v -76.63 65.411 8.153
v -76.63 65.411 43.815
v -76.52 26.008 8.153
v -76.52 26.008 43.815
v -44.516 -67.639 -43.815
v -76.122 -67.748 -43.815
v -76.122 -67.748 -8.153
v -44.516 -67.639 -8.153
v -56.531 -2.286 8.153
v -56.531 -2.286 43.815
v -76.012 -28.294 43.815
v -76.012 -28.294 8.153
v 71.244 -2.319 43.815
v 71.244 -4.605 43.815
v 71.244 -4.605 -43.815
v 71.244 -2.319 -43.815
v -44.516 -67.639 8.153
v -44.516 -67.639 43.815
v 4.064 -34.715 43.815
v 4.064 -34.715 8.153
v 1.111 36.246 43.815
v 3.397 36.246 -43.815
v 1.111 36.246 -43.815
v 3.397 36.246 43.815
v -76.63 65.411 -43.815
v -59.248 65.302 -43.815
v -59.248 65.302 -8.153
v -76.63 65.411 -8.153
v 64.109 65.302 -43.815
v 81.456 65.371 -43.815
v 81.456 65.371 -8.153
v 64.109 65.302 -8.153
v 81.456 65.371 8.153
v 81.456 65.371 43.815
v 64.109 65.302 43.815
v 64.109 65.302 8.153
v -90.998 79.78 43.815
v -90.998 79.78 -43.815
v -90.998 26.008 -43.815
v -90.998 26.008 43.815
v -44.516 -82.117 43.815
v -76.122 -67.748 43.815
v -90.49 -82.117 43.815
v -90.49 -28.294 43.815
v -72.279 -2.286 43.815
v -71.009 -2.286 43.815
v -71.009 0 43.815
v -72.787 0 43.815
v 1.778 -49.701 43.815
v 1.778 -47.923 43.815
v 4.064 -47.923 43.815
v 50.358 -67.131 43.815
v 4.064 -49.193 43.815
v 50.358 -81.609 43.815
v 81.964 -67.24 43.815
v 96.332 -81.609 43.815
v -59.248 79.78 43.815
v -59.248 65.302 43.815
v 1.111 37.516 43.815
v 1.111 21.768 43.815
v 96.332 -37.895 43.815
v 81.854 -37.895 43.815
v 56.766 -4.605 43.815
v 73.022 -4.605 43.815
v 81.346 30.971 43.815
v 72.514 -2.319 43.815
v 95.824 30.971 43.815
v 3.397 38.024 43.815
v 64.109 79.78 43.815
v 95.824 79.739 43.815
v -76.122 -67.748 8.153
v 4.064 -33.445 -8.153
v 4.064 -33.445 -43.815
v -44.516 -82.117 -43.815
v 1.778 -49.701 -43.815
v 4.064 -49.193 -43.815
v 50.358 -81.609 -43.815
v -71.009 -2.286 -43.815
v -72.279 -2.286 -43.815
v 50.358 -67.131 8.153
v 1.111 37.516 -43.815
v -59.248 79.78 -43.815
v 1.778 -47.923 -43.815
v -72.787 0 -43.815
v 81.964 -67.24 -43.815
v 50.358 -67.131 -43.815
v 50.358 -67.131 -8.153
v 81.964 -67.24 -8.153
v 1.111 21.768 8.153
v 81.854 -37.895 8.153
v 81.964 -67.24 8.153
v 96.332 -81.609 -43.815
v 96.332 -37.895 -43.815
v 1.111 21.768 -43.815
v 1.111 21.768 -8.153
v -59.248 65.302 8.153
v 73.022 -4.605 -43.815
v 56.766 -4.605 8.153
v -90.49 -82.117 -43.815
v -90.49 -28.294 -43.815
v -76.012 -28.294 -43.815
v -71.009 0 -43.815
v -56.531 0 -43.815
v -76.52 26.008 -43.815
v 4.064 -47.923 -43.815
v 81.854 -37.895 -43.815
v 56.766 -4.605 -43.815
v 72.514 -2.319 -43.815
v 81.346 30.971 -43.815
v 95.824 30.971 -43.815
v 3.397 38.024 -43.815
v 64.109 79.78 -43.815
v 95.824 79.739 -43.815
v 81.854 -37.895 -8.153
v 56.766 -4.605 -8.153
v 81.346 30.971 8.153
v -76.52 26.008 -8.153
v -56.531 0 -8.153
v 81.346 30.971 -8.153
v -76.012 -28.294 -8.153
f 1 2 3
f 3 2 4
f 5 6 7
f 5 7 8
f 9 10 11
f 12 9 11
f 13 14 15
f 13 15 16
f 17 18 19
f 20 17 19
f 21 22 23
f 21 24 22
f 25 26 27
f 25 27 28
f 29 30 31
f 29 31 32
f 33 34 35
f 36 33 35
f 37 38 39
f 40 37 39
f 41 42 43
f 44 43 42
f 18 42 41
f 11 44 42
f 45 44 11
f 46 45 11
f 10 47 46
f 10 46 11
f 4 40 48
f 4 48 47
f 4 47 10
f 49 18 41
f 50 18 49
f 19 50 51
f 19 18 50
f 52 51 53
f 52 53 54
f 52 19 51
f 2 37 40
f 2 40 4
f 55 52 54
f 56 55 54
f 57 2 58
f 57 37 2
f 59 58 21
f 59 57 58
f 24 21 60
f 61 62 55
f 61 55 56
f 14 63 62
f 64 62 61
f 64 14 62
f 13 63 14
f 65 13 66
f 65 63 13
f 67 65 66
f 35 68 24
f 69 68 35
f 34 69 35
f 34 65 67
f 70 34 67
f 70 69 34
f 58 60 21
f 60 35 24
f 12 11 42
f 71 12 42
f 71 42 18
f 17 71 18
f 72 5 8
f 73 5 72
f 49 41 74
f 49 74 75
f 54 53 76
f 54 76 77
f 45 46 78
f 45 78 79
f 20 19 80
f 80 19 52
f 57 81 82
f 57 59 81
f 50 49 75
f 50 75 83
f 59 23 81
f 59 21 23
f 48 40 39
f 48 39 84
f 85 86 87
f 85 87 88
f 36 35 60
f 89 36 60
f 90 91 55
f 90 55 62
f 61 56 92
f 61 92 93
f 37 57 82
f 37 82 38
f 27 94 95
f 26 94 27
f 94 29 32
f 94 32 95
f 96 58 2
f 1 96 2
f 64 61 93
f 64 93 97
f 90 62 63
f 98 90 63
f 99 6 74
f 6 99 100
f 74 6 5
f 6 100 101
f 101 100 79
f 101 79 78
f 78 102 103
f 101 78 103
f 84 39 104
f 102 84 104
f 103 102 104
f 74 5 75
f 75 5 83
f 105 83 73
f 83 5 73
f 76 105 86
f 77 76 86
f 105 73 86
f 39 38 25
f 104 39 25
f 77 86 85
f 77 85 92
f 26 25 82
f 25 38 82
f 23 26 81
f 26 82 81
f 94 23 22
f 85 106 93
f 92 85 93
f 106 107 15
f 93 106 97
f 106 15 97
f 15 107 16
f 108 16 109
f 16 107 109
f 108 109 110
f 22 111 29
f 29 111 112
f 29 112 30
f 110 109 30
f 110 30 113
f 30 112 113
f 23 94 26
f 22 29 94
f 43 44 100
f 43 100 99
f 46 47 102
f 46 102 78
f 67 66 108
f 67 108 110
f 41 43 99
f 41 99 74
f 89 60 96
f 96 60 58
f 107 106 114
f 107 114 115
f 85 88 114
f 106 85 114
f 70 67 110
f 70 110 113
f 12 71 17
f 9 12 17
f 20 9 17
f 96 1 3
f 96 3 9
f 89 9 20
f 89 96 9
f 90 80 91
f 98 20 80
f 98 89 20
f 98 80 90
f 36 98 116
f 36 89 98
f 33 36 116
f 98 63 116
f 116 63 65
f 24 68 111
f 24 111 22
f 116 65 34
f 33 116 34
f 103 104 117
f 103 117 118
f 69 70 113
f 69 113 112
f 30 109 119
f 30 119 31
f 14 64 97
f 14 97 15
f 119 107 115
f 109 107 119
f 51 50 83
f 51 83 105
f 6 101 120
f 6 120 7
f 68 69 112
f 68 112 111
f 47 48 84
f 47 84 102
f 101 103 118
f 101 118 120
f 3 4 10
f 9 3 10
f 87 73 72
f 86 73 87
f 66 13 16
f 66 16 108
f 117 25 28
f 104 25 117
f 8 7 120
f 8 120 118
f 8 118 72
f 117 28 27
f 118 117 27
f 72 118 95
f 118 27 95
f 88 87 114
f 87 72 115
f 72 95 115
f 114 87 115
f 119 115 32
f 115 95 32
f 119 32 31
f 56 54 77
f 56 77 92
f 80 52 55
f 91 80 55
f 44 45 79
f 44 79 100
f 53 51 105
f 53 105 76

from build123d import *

# Parameters (mm, degrees)
F1_DEPTH = 43.815
F4_DEPTH = 36.0426
F7_DEPTH = 36.0426


with BuildPart() as f1:
    # F0 (on Top) → F1 (new body, symmetric)
    with BuildSketch(Plane.XY):
        Polygon((1.111168, 37.515668), (-59.248378, 79.779877), (-90.998378, 79.779877), (-90.998378, 26.008077), (-72.787326, 0), (-71.009326, 0), (-71.009326, -2.286), (-72.279326, -2.286), (-90.490378, -28.294077), (-90.490378, -82.116677), (-44.516378, -82.116677), (1.778, -49.701005), (1.778, -47.923005), (4.064, -47.923005), (4.064, -49.193005), (50.358378, -81.608677), (96.332378, -81.608677), (96.332378, -37.895277), (73.022231, -4.604938), (71.244231, -4.604938), (71.244231, -2.318938), (72.514231, -2.318938), (95.824378, 30.971401), (95.824378, 79.739401), (64.109252, 79.779877), (3.397168, 38.023668), (3.397168, 36.245668), (1.111168, 36.245668), align=None)
    extrude(amount=F1_DEPTH, both=True)

    # F3 (on offset) → F4 (cut)
    with BuildSketch(Plane.XY.offset(44.196)):
        Polygon((81.455968, 65.370991), (64.109252, 65.301877), (1.111168, 21.767668), (-59.248378, 65.301877), (-76.629968, 65.411468), (-76.520378, 26.008077), (-56.531326, -2.286), (-76.012378, -28.294077), (-76.121968, -67.748268), (-44.516378, -67.638677), (4.064, -34.715005), (50.358378, -67.130677), (81.963968, -67.240268), (81.854378, -37.895277), (56.766231, -4.604938), (81.346378, 30.971401), align=None)
    extrude(amount=-F4_DEPTH, mode=Mode.SUBTRACT)

    # F6 (on offset) → F7 (cut)
    with BuildSketch(Plane.XY.offset(-44.196)):
        Polygon((-76.012378, -28.294077), (-76.121968, -67.748268), (-44.516378, -67.638677), (4.064, -33.445005), (50.358378, -67.130677), (81.963968, -67.240268), (81.854378, -37.895277), (56.766231, -4.604938), (81.346378, 30.971401), (81.455968, 65.370991), (64.109252, 65.301877), (1.111168, 21.767668), (-59.248378, 65.301877), (-76.629968, 65.411468), (-76.520378, 26.008077), (-56.531326, 0), align=None)
    extrude(amount=F7_DEPTH, mode=Mode.SUBTRACT)


solid = f1.part
